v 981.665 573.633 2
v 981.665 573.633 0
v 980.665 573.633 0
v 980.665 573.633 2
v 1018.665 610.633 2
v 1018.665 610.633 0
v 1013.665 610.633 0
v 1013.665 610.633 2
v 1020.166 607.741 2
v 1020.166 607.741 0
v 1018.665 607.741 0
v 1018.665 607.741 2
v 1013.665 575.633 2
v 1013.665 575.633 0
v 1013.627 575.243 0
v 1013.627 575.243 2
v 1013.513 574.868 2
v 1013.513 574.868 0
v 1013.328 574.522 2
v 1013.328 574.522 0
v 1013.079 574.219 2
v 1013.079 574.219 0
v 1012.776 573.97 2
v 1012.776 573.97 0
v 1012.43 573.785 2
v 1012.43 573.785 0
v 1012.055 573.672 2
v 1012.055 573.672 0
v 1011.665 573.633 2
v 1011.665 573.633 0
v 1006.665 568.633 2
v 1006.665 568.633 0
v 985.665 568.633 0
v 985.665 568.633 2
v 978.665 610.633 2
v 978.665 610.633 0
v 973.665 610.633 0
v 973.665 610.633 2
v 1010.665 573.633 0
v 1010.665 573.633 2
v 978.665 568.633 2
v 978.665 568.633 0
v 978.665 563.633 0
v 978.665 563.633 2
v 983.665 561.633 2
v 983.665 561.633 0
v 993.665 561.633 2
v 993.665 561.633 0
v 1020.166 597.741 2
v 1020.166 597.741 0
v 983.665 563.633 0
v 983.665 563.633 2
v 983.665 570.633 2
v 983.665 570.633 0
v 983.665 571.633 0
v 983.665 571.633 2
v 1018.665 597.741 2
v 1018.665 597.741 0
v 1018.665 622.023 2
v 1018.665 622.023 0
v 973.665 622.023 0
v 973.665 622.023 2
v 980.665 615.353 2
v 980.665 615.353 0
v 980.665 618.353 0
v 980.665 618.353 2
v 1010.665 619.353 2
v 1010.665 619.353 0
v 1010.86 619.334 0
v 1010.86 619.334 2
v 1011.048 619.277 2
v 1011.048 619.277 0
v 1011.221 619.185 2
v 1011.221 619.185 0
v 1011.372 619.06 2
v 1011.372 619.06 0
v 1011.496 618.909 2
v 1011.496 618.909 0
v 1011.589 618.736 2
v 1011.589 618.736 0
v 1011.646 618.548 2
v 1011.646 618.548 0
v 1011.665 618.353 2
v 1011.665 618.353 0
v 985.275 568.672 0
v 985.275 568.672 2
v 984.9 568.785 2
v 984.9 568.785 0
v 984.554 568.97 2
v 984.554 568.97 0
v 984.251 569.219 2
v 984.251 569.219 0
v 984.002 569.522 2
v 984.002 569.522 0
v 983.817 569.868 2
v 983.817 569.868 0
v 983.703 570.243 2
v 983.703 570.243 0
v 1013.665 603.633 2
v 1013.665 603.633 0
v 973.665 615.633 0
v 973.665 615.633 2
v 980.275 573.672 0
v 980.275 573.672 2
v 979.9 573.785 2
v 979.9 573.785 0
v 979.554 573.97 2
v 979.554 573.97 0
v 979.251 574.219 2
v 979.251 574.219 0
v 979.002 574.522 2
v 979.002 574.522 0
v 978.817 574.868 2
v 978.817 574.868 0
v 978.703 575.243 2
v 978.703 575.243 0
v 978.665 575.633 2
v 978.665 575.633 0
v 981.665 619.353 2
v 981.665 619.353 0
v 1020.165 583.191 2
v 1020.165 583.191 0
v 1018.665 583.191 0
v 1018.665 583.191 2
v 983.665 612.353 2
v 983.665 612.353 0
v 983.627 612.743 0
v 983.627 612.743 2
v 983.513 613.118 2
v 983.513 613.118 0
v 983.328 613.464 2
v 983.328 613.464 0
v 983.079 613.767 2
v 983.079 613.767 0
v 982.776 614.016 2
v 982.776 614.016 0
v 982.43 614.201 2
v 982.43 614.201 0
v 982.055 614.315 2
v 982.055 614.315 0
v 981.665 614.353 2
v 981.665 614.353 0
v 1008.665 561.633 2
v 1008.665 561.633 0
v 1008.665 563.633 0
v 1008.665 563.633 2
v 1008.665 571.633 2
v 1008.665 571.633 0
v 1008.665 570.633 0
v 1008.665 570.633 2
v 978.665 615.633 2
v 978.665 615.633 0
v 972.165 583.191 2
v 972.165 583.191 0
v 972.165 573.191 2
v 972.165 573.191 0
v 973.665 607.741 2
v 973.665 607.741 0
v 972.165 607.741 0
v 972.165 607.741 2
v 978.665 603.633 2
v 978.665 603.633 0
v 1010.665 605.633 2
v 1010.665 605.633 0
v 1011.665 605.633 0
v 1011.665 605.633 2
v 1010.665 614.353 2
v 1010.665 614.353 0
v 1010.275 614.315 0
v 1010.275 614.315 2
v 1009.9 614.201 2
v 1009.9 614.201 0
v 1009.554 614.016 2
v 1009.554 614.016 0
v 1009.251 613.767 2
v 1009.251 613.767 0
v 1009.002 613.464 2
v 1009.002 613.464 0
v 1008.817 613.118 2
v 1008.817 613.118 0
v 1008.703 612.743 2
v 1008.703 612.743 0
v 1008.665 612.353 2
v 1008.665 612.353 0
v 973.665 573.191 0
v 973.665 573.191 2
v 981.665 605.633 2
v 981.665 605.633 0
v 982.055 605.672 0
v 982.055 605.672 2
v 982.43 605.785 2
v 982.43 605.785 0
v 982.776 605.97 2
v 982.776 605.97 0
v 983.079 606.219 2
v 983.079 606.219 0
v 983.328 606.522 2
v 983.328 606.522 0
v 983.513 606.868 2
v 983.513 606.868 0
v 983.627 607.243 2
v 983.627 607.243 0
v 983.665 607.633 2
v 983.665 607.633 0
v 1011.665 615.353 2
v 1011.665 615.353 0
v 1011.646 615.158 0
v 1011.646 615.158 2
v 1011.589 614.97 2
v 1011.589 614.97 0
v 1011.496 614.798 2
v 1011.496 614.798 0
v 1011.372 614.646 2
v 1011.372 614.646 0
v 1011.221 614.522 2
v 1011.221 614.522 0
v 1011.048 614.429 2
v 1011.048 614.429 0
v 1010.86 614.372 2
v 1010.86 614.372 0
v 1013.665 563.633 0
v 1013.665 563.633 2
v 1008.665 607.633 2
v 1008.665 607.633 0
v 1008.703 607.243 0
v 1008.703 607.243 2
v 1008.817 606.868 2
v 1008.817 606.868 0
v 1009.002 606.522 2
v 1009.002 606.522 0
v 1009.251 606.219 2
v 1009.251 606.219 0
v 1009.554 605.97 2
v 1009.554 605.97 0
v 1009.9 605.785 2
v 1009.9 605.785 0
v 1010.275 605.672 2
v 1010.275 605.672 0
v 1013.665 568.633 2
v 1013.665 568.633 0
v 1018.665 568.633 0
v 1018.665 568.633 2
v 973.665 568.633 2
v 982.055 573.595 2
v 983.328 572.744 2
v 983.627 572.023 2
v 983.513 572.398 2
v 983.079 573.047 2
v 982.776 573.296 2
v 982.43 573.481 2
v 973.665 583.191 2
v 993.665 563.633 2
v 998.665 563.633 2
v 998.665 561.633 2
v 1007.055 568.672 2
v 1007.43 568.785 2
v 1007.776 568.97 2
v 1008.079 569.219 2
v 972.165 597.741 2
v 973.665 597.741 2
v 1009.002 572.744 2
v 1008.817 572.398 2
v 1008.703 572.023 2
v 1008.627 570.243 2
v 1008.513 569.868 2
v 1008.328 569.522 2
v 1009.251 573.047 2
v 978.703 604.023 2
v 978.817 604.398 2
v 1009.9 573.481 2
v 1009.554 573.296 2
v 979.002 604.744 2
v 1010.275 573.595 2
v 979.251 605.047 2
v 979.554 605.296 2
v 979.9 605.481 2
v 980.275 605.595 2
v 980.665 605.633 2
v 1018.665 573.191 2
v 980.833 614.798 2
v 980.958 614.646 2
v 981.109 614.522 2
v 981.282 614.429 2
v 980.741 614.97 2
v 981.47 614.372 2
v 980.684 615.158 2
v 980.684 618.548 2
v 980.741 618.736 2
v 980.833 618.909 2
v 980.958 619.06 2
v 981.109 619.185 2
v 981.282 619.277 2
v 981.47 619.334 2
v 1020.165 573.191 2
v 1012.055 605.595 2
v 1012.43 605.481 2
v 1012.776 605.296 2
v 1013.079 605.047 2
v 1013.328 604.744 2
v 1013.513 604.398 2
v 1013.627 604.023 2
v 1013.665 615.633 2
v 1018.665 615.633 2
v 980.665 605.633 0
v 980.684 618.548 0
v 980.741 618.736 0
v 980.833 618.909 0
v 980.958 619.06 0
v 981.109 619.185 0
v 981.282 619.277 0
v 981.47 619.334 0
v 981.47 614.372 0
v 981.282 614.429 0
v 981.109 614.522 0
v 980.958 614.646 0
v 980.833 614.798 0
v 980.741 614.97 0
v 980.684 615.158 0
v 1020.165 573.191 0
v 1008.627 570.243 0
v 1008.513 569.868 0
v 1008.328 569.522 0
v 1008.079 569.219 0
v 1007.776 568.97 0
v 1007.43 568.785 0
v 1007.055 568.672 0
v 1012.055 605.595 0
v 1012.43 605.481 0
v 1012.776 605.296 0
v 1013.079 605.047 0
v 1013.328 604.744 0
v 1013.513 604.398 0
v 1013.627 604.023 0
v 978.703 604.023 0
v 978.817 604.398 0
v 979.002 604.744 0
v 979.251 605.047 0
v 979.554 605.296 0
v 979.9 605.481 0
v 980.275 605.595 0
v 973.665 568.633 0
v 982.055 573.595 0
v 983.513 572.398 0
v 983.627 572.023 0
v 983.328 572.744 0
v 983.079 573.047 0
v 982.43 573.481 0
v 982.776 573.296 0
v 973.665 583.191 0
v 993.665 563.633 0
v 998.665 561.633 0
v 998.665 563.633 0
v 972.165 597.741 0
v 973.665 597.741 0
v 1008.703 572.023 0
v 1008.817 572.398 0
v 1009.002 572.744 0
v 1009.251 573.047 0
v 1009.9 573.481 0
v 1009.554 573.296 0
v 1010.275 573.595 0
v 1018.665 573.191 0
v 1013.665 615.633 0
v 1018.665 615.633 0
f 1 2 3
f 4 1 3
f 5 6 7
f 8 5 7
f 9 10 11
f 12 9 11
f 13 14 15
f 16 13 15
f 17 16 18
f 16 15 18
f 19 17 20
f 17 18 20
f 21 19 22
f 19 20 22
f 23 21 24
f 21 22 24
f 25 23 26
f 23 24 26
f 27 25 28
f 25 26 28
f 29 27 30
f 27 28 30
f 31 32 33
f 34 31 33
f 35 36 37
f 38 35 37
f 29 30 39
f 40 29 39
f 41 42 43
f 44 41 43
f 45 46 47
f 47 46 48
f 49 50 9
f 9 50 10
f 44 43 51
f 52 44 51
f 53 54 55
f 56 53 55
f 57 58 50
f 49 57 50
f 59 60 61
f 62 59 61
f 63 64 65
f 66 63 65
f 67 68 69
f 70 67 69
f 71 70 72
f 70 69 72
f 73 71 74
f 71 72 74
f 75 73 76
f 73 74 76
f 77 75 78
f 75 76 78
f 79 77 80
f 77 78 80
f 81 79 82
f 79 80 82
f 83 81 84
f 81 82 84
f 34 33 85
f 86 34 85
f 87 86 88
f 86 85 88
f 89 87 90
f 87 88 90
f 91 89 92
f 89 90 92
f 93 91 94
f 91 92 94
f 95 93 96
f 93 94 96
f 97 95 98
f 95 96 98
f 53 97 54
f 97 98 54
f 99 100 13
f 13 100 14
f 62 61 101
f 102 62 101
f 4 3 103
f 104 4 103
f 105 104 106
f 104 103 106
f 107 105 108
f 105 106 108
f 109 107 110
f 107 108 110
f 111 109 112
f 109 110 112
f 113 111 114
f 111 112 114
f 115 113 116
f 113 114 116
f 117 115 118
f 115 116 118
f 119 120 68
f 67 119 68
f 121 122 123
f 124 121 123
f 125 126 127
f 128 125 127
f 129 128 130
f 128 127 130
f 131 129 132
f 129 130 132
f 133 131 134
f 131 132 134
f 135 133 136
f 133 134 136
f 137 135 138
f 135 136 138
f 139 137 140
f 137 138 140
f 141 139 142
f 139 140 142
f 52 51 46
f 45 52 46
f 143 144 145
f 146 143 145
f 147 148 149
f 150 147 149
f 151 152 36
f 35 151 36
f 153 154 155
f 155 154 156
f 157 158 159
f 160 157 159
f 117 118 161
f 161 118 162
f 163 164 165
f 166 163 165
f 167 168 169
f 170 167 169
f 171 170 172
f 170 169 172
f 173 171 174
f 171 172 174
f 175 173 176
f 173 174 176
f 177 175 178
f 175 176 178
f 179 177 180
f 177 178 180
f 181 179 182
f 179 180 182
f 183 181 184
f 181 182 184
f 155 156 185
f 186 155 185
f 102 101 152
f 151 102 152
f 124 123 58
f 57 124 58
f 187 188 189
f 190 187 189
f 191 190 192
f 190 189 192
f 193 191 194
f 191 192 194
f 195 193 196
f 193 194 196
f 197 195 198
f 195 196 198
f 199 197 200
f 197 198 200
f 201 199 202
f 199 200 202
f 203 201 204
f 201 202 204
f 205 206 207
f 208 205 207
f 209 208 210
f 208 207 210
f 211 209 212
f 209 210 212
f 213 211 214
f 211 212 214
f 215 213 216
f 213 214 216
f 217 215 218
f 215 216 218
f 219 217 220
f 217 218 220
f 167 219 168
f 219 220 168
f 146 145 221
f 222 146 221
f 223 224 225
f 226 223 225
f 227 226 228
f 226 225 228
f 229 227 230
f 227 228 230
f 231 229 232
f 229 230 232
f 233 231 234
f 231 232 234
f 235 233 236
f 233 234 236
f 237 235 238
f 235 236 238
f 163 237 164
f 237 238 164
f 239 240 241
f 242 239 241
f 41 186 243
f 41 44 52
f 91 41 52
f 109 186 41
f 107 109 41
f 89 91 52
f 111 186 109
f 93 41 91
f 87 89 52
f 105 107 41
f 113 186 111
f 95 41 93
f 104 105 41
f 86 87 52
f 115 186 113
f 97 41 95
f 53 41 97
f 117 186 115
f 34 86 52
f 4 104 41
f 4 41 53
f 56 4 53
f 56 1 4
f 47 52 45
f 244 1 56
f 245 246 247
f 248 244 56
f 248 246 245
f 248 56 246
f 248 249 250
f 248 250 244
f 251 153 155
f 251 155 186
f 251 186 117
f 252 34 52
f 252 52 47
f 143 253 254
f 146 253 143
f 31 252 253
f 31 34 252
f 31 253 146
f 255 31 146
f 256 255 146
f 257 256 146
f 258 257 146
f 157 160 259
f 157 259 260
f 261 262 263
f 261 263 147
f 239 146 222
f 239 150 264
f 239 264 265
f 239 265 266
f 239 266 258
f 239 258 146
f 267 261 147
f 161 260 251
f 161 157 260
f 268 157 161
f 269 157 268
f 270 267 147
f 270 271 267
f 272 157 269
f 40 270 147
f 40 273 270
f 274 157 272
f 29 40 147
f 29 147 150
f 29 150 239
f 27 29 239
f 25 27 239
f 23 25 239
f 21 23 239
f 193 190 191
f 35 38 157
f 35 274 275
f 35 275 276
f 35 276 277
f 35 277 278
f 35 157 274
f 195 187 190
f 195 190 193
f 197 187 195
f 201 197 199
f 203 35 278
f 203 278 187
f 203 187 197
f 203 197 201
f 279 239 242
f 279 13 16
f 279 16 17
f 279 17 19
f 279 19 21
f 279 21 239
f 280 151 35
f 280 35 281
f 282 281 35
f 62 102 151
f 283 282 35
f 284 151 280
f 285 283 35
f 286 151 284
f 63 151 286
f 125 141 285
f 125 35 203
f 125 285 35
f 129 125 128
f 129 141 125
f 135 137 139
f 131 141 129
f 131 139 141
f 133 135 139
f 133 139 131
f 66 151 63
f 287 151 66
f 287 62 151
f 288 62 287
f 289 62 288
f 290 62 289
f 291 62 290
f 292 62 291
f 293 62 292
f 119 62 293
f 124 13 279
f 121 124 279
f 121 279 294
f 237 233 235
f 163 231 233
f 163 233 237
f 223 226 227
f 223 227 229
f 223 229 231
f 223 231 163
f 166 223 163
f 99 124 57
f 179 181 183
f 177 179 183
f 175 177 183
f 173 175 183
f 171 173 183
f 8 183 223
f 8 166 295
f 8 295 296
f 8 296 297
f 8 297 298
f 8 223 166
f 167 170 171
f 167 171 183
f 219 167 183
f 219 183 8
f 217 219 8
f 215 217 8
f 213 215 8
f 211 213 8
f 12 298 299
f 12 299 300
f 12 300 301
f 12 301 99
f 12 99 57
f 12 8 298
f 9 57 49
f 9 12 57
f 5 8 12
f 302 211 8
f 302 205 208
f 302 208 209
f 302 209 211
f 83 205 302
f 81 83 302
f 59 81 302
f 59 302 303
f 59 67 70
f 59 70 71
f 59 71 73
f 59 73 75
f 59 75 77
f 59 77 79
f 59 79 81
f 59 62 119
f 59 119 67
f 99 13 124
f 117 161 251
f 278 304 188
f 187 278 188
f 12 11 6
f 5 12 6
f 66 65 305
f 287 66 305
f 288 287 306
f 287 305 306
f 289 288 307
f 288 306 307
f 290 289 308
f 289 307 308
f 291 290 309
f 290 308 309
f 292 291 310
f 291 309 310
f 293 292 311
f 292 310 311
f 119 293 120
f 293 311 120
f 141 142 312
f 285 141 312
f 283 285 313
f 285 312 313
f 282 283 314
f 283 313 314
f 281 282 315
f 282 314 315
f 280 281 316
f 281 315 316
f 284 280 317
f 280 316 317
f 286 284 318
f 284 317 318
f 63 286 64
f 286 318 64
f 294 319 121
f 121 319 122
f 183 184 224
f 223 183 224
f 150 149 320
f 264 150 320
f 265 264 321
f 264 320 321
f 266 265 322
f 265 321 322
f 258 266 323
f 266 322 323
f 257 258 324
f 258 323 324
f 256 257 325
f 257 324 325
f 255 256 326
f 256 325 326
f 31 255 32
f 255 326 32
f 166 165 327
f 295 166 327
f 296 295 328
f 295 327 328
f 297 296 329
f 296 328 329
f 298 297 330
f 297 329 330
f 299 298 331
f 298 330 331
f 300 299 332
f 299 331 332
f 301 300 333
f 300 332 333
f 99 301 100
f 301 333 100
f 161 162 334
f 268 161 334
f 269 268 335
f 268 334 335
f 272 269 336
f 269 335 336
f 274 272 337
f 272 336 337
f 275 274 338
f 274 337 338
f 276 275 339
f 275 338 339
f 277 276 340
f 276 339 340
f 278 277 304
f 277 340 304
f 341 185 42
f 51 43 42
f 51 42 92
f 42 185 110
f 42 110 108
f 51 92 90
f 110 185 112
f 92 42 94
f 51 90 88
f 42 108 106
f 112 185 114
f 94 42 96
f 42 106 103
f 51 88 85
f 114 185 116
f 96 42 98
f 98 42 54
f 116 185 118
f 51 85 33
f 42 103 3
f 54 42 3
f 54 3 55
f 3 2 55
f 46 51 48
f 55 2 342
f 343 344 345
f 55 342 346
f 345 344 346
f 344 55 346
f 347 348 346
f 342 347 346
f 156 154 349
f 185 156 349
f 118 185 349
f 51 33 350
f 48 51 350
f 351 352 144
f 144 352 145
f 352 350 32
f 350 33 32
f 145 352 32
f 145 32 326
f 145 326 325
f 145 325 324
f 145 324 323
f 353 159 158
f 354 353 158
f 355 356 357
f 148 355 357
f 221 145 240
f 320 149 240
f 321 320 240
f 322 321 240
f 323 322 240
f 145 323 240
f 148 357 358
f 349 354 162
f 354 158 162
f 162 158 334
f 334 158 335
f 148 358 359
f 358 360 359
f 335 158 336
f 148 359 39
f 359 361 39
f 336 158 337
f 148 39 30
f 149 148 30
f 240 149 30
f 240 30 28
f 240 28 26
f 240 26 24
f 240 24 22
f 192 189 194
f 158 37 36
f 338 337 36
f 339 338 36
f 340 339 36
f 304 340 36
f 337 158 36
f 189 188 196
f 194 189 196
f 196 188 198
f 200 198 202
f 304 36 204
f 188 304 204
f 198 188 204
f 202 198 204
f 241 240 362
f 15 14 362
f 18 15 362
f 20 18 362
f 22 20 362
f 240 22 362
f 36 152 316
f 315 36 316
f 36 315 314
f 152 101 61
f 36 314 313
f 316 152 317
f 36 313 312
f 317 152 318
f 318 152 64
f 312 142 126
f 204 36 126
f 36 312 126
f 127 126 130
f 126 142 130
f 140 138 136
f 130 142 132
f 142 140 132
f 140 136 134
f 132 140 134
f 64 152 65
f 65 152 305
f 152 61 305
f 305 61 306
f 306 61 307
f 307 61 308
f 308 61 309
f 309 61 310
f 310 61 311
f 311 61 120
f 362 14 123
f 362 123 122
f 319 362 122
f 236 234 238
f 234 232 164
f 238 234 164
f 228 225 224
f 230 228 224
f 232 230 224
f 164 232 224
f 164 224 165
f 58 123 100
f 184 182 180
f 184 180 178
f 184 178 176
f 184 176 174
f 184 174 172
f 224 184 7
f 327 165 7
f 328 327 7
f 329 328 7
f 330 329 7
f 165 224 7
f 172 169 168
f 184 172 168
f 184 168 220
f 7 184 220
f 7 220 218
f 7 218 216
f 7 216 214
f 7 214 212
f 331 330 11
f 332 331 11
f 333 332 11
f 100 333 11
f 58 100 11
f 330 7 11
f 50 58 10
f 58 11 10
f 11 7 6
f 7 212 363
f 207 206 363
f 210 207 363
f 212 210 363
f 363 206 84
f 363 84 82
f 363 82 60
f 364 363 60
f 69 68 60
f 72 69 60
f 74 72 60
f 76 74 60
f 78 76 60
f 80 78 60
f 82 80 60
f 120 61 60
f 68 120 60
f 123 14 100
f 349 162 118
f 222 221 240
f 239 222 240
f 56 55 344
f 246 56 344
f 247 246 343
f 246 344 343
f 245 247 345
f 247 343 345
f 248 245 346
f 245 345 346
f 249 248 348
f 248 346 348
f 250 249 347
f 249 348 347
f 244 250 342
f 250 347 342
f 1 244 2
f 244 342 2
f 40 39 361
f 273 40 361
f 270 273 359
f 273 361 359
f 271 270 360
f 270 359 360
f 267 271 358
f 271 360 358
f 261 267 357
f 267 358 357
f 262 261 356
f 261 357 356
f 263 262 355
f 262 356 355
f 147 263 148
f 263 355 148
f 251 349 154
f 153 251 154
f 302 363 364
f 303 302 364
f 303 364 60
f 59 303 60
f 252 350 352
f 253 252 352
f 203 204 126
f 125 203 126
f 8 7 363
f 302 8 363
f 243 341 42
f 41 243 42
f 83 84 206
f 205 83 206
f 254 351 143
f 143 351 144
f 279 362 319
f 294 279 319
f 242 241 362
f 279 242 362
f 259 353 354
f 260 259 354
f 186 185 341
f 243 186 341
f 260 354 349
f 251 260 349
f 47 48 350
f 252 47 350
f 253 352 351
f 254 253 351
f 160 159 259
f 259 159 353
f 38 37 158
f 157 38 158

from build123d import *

# Parameters (mm, degrees)
EXTRUDE_1_DEPTH = 2


with BuildPart() as part:
    # Model → 凸台-拉伸1 (new body)
    with BuildSketch(Plane.XY):
        Polygon((973.664956946, 622.02348986), (973.664956946, 615.633131528), (978.664956946, 615.633131528), (978.664956946, 610.633131528), (973.664956946, 610.633131528), (973.664956946, 607.740854359), (972.164956946, 607.740854359), (972.164956946, 597.740854359), (973.664956946, 597.740854359), (973.664956946, 583.190731528), (972.164956946, 583.190731528), (972.164956946, 573.190731528), (973.664956946, 573.190731528), (973.664956946, 568.633131528), (978.664956946, 568.633131528), (978.664956946, 563.633131528), (983.664956946, 563.633131528), (983.664956946, 561.633131528), (993.664956946, 561.633131528), (993.664956946, 563.633131528), (998.664956946, 563.633131528), (998.664956946, 561.633131528), (1008.664956946, 561.633131528), (1008.664956946, 563.633131528), (1013.664956946, 563.633131528), (1013.664956946, 568.633131528), (1018.664956946, 568.633131528), (1018.664956946, 573.190731528), (1020.164956946, 573.190731528), (1020.164956946, 583.190731528), (1018.664956946, 583.190731528), (1018.664956946, 597.740854359), (1020.16592277, 597.740854359), (1020.16592277, 607.740854359), (1018.664956946, 607.740854359), (1018.664956946, 610.633131528), (1013.664956946, 610.633131528), (1013.664956946, 615.633131528), (1018.664956946, 615.633131528), (1018.664956946, 622.02348986), align=None)
        with BuildLine():
            Line((980.664956946, 605.633131528), (981.664956946, 605.633131528))
            ThreePointArc((981.664956946, 605.633131528), (983.079170509, 606.218917965), (983.664956946, 607.633131528))
            Line((983.664956946, 607.633131528), (983.664956946, 612.353131528))
            ThreePointArc((983.664956946, 612.353131528), (983.079170509, 613.76734509), (981.664956946, 614.353131528))
            ThreePointArc((981.664956946, 614.353131528), (980.957850165, 614.646024746), (980.664956946, 615.353131528))
            Line((980.664956946, 615.353131528), (980.664956946, 618.353131528))
            ThreePointArc((980.664956946, 618.353131528), (980.957850165, 619.060238309), (981.664956946, 619.353131528))
            Line((981.664956946, 619.353131528), (1010.664956946, 619.353131528))
            ThreePointArc((1010.664956946, 619.353131528), (1011.372063727, 619.060238309), (1011.664956946, 618.353131528))
            Line((1011.664956946, 618.353131528), (1011.664956946, 615.353131528))
            ThreePointArc((1011.664956946, 615.353131528), (1011.372063727, 614.646024746), (1010.664956946, 614.353131528))
            ThreePointArc((1010.664956946, 614.353131528), (1009.250743384, 613.76734509), (1008.664956946, 612.353131528))
            Line((1008.664956946, 612.353131528), (1008.664956946, 607.633131528))
            ThreePointArc((1008.664956946, 607.633131528), (1009.250743384, 606.218917965), (1010.664956946, 605.633131528))
            Line((1010.664956946, 605.633131528), (1011.664956946, 605.633131528))
            ThreePointArc((1011.664956946, 605.633131528), (1013.079170509, 605.04734509), (1013.664956946, 603.633131528))
            Line((1013.664956946, 603.633131528), (1013.664956946, 575.633131528))
            ThreePointArc((1013.664956946, 575.633131528), (1013.079170509, 574.218917965), (1011.664956946, 573.633131528))
            Line((1011.664956946, 573.633131528), (1010.664956946, 573.633131528))
            ThreePointArc((1010.664956946, 573.633131528), (1009.250743384, 573.04734509), (1008.664956946, 571.633131528))
            Line((1008.664956946, 571.633131528), (1008.664956946, 570.633131528))
            ThreePointArc((1008.664956946, 570.633131528), (1008.079170509, 569.218917965), (1006.664956946, 568.633131528))
            Line((1006.664956946, 568.633131528), (985.664956946, 568.633131528))
            ThreePointArc((985.664956946, 568.633131528), (984.250743384, 569.218917965), (983.664956946, 570.633131528))
            Line((983.664956946, 570.633131528), (983.664956946, 571.633131528))
            ThreePointArc((983.664956946, 571.633131528), (983.079170509, 573.04734509), (981.664956946, 573.633131528))
            Line((981.664956946, 573.633131528), (980.664956946, 573.633131528))
            ThreePointArc((980.664956946, 573.633131528), (979.250743384, 574.218917965), (978.664956946, 575.633131528))
            Line((978.664956946, 575.633131528), (978.664956946, 603.633131528))
            ThreePointArc((978.664956946, 603.633131528), (979.250743384, 605.04734509), (980.664956946, 605.633131528))
        make_face(mode=Mode.SUBTRACT)
    extrude(amount=EXTRUDE_1_DEPTH)


solid = part.part
